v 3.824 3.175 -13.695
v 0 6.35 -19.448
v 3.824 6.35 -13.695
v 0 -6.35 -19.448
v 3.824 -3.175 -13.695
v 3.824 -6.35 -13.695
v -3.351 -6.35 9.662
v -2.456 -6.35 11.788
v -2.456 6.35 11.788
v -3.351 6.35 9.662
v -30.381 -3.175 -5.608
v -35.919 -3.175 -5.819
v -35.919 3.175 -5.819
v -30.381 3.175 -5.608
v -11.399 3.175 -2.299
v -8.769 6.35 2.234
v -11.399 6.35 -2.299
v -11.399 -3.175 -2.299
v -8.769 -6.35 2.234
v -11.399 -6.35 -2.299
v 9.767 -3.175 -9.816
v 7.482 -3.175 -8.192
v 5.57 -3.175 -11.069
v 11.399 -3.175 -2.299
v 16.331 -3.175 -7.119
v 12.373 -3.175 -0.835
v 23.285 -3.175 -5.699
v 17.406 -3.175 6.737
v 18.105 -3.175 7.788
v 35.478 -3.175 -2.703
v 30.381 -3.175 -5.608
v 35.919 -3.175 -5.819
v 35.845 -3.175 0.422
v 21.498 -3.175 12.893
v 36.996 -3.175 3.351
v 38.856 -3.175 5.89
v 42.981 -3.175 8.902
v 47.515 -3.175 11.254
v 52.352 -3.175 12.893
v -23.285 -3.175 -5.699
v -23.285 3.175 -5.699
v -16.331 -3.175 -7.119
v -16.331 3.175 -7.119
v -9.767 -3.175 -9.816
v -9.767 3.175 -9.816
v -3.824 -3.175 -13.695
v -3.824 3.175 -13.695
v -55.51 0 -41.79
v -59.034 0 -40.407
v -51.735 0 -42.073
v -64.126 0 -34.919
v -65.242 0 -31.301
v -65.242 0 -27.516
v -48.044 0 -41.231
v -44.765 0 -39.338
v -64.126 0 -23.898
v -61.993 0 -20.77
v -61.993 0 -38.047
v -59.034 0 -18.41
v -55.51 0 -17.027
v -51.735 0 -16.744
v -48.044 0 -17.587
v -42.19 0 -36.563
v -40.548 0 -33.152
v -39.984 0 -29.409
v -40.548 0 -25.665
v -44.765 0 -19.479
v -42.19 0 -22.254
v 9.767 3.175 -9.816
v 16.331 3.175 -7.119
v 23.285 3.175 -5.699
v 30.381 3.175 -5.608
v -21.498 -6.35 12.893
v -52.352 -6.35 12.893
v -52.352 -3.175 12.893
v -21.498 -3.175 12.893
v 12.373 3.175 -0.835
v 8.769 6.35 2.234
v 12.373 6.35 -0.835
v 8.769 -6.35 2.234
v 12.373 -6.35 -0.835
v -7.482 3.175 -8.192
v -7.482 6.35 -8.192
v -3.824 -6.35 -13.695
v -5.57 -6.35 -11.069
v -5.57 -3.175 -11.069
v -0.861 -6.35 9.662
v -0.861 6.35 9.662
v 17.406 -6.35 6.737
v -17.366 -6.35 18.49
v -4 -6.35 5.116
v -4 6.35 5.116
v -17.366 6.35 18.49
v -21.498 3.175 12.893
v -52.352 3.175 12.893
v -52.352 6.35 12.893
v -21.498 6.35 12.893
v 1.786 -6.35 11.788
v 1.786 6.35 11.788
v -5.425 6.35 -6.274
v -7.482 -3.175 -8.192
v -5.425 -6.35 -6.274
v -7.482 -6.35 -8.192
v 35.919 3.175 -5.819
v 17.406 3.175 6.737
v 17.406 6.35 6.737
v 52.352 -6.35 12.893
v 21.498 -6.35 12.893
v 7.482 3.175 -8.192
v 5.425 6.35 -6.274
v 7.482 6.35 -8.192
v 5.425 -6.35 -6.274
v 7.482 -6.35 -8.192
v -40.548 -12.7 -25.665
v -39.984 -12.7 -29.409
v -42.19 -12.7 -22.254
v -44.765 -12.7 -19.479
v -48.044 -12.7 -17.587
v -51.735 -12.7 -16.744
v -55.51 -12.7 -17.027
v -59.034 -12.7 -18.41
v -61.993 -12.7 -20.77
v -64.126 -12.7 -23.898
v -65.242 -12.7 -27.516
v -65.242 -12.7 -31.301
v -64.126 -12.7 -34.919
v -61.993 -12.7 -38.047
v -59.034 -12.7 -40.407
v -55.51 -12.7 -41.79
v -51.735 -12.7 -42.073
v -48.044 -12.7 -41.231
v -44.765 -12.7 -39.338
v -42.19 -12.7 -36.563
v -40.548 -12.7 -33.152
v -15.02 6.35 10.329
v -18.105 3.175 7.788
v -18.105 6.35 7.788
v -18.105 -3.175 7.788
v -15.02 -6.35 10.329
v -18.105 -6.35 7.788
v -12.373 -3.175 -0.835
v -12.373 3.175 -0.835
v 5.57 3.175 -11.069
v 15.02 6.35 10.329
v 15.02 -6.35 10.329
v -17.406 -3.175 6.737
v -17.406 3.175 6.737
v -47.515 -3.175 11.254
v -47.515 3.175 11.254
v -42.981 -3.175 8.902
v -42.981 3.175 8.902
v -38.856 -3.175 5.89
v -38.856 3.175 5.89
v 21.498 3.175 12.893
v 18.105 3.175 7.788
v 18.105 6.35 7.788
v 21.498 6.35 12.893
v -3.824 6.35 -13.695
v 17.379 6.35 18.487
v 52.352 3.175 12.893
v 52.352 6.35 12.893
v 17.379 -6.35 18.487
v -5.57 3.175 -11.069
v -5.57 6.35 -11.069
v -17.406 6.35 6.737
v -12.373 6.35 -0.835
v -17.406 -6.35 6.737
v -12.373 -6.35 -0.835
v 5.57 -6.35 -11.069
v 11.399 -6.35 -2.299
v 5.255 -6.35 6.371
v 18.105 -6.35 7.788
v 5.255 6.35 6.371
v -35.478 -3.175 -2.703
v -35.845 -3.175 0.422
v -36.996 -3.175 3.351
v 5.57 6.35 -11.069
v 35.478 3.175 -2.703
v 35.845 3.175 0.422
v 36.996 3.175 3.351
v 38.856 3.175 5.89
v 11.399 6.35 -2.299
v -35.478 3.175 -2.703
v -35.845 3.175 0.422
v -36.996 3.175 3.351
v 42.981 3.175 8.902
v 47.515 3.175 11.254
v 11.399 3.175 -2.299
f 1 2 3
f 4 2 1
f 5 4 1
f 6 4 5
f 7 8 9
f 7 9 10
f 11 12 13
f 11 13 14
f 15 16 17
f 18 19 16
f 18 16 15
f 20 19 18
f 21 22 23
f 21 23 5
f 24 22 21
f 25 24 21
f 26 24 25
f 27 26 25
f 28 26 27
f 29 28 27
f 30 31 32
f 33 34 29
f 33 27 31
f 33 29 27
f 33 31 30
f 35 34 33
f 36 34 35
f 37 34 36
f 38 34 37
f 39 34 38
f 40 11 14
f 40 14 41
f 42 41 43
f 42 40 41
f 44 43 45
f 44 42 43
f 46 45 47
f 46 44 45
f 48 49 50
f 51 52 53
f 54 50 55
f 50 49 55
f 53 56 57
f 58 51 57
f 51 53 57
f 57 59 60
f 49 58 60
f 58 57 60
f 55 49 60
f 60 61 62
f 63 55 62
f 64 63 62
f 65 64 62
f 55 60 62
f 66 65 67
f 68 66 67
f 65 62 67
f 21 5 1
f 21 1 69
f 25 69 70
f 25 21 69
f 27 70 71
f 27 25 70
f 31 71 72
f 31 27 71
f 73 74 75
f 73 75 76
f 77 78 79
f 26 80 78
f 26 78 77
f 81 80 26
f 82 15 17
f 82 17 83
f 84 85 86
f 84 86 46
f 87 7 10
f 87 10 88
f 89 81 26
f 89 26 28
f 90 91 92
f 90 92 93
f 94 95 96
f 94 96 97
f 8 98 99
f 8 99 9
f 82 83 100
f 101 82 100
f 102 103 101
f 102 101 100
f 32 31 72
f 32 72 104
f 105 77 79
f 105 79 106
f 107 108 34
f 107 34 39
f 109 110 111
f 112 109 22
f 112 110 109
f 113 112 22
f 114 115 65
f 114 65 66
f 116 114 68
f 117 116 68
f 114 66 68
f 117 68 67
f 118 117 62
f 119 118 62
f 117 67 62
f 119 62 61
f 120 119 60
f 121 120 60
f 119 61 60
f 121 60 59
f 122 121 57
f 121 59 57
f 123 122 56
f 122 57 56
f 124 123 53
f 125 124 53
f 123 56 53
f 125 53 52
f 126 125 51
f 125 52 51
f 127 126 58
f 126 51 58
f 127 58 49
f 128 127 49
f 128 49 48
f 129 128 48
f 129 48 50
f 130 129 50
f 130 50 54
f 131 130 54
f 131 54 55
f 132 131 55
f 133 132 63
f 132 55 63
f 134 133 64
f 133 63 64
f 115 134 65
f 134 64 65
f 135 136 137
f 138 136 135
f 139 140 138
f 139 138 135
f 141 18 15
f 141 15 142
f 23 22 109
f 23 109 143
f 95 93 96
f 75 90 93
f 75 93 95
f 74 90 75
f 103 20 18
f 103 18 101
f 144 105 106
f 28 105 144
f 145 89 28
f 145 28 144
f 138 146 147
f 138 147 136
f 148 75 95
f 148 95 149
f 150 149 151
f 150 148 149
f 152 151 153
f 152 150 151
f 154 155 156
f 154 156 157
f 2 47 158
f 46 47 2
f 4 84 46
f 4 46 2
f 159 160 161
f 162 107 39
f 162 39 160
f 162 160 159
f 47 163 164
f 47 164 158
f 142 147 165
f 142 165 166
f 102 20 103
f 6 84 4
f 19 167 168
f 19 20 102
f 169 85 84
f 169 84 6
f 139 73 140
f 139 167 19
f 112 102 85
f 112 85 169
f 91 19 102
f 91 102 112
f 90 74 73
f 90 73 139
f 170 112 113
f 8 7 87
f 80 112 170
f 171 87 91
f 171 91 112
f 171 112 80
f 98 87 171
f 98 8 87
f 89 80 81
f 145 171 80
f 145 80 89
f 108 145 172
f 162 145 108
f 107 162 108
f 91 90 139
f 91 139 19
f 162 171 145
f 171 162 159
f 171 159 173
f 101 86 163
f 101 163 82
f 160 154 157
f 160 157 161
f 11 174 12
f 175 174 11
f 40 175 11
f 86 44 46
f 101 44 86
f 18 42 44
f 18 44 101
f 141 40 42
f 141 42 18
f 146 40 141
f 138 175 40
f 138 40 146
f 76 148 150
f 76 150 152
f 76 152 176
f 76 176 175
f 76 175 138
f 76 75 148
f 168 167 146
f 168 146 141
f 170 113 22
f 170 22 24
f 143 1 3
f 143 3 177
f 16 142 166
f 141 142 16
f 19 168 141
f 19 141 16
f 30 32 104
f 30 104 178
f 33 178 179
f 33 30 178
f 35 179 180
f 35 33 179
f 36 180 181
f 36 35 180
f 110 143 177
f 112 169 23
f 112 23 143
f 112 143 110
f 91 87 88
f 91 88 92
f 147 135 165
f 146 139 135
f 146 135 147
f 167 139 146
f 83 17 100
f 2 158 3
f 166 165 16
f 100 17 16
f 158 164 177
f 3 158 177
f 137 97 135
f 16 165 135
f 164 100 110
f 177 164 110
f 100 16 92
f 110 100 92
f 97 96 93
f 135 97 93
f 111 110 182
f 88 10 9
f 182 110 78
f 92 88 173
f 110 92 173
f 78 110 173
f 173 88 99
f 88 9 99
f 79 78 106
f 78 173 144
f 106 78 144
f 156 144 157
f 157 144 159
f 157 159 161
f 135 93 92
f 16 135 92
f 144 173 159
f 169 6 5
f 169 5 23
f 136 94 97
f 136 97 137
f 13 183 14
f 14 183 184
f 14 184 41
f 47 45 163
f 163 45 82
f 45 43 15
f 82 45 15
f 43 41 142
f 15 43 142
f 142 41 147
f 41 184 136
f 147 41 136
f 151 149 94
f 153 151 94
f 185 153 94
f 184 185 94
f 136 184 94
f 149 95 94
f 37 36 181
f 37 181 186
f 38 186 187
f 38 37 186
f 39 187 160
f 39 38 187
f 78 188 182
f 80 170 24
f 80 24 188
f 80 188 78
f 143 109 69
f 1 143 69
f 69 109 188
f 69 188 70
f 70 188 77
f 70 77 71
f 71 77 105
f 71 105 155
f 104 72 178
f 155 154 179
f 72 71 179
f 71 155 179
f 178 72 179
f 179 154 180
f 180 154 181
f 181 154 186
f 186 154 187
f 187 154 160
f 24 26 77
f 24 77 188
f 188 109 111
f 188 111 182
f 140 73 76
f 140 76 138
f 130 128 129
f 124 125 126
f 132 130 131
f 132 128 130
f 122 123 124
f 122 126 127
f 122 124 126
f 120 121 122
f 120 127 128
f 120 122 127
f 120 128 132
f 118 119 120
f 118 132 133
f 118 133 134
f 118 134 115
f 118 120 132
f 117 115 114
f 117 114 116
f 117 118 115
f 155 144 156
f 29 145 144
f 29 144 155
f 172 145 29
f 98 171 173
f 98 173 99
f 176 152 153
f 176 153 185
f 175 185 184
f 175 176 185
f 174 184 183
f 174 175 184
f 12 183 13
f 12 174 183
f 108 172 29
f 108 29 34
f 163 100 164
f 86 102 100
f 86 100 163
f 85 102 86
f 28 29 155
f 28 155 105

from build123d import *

# Parameters (mm, degrees)
F1_DEPTH = 6.35
F2_DEPTH = 3.175
F3_R     = 12.7
F4_DEPTH = 12.7


# Not quite as in the source:
# - a feature names something its author has since deleted; it is built from what else it names


with BuildPart() as f1:
    # F0 (on Front) → F1 (new body, symmetric)
    with BuildSketch(Plane.XZ):
        Polygon((1.7863946268, 11.7875747383), (0, 11.7875747383), (-2.4559120648, 11.7875747383), (-3.3509915229, 9.6617611125), (-0.8608896751, 9.6617611125), (-4.0002167225, 5.1155993715), (-17.3656828701, 18.4895154089), (-52.352450788, 12.8932353109), (-21.4979629964, 12.8932353109), (-18.104581877, 7.788236776), (-15.0197930634, 10.3294737637), (-17.406011636, 6.7373085332), (-12.3725614796, -0.8350079177), (-8.7693203241, 2.2335082758), (-11.3994373246, -2.2989747433), (-7.4821490115, -8.1921386397), (-5.4247728549, -6.2737190165), (-5.5697021181, -11.06922148), (-3.8242271729, -13.6951119192), (0, -19.4482747465), (3.8242271729, -13.6951119192), (5.5697021181, -11.06922148), (5.4247728549, -6.2737190165), (7.4821490115, -8.1921386397), (11.3994373246, -2.2989747433), (8.7693203241, 2.2335082758), (12.3725614796, -0.8350079177), (17.406011636, 6.7373085332), (15.0197930634, 10.3294737637), (18.104581877, 7.788236776), (21.4979629964, 12.8932353109), (52.352450788, 12.8932353109), (17.3786748844, 18.4874372818), (5.2548269741, 6.3712494448), align=None)
    extrude(amount=F1_DEPTH, both=True)

    # F0 (on Front) → F2 (join, symmetric)
    with BuildSketch(Plane.XZ):
        Polygon((1.7863946268, 11.7875747383), (0, 11.7875747383), (-2.4559120648, 11.7875747383), (-3.3509915229, 9.6617611125), (-0.8608896751, 9.6617611125), (-4.0002167225, 5.1155993715), (-17.3656828701, 18.4895154089), (-52.352450788, 12.8932353109), (-21.4979629964, 12.8932353109), (-18.104581877, 7.788236776), (-15.0197930634, 10.3294737637), (-17.406011636, 6.7373085332), (-12.3725614796, -0.8350079177), (-8.7693203241, 2.2335082758), (-11.3994373246, -2.2989747433), (-7.4821490115, -8.1921386397), (-5.4247728549, -6.2737190165), (-5.5697021181, -11.06922148), (-3.8242271729, -13.6951119192), (0, -19.4482747465), (3.8242271729, -13.6951119192), (5.5697021181, -11.06922148), (5.4247728549, -6.2737190165), (7.4821490115, -8.1921386397), (11.3994373246, -2.2989747433), (8.7693203241, 2.2335082758), (12.3725614796, -0.8350079177), (17.406011636, 6.7373085332), (15.0197930634, 10.3294737637), (18.104581877, 7.788236776), (21.4979629964, 12.8932353109), (52.352450788, 12.8932353109), (17.3786748844, 18.4874372818), (5.2548269741, 6.3712494448), align=None)
        with BuildLine():
            ThreePointArc((38.8560444117, 5.8900536969), (45.2033351378, 10.1642758317), (52.352450788, 12.8932353109))
            Line((52.352450788, 12.8932353109), (21.4979629964, 12.8932353109))
            Line((21.4979629964, 12.8932353109), (18.104581877, 7.788236776))
            Line((18.104581877, 7.788236776), (17.406011636, 6.7373085332))
            Line((17.406011636, 6.7373085332), (12.3725614796, -0.8350079177))
            Line((12.3725614796, -0.8350079177), (11.3994373246, -2.2989747433))
            Line((11.3994373246, -2.2989747433), (7.4821490115, -8.1921386397))
            Line((7.4821490115, -8.1921386397), (5.5697021181, -11.06922148))
            Line((5.5697021181, -11.06922148), (3.8242271729, -13.6951119192))
            ThreePointArc((3.8242271729, -13.6951119192), (16.3311358391, -7.118704323), (30.380692333, -5.6081204675))
            Line((30.380692333, -5.6081204675), (35.918712616, -5.8190925047))
            ThreePointArc((35.918712616, -5.8190925047), (35.8448269076, 0.4224418486), (38.8560444117, 5.8900536969))
        make_face()
        with BuildLine():
            Line((-21.4979629964, 12.8932353109), (-52.352450788, 12.8932353109))
            ThreePointArc((-52.352450788, 12.8932353109), (-45.2033351378, 10.1642758317), (-38.8560444117, 5.8900536969))
            ThreePointArc((-38.8560444117, 5.8900536969), (-35.8448269076, 0.4224418486), (-35.918712616, -5.8190925047))
            Line((-35.918712616, -5.8190925047), (-30.380692333, -5.6081204675))
            ThreePointArc((-30.380692333, -5.6081204675), (-16.3311358391, -7.118704323), (-3.8242271729, -13.6951119192))
            Line((-3.8242271729, -13.6951119192), (-5.5697021181, -11.06922148))
            Line((-5.5697021181, -11.06922148), (-7.4821490115, -8.1921386397))
            Line((-7.4821490115, -8.1921386397), (-11.3994373246, -2.2989747433))
            Line((-11.3994373246, -2.2989747433), (-12.3725614796, -0.8350079177))
            Line((-12.3725614796, -0.8350079177), (-17.406011636, 6.7373085332))
            Line((-17.406011636, 6.7373085332), (-18.104581877, 7.788236776))
            Line((-18.104581877, 7.788236776), (-21.4979629964, 12.8932353109))
        make_face()
    extrude(amount=F2_DEPTH, both=True)


with BuildPart() as f4:
    # F3 (on Front) → F4 (new body)
    with BuildSketch(Plane.XZ):
        with Locations((-52.6836439967, -29.408633709)):
            Circle(F3_R)
    extrude(amount=F4_DEPTH)


solid = Compound([f1.part, f4.part])
